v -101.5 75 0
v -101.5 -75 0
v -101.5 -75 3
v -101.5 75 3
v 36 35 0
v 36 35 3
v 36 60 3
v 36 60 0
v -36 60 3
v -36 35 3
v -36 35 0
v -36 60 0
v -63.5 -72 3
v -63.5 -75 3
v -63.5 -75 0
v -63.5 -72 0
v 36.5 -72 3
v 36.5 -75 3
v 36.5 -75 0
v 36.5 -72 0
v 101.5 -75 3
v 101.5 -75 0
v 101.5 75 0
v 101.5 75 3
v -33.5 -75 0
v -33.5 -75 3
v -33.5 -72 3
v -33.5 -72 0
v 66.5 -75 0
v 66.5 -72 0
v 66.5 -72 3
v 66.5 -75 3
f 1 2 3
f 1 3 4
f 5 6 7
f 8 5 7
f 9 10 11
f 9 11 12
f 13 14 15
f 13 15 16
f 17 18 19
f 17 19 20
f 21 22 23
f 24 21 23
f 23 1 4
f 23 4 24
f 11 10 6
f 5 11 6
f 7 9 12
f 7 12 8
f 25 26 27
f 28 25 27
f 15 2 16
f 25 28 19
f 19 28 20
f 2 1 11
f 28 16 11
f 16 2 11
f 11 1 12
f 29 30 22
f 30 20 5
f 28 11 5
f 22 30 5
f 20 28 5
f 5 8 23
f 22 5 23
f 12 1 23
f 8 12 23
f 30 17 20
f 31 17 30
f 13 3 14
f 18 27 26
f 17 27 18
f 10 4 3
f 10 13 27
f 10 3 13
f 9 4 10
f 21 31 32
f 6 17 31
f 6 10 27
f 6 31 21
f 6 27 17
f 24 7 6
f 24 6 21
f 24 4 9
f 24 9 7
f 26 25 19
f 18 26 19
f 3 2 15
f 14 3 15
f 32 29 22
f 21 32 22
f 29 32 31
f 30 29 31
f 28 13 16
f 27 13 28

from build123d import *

# Parameters (mm, degrees)
SKETCH1_W           = 203
SKETCH1_H           = 150
BOSS_EXTRUDE1_DEPTH = 3
SKETCH2_W           = 72
SKETCH2_H           = 25
CUT_EXTRUDE1_DEPTH  = 10
SKETCH3_W           = 30
SKETCH3_H           = 3
CUT_EXTRUDE2_DEPTH  = 10


with BuildPart() as part:
    # Sketch1 → Boss-Extrude1 (new body)
    with BuildSketch(Plane.XY):
        Rectangle(SKETCH1_W, SKETCH1_H)
    extrude(amount=BOSS_EXTRUDE1_DEPTH)

    # Sketch2 → Cut-Extrude1 (cut)
    with BuildSketch(Plane.XY.offset(3)):
        with Locations((0, 47.5)):
            Rectangle(SKETCH2_W, SKETCH2_H)
    extrude(amount=-CUT_EXTRUDE1_DEPTH, mode=Mode.SUBTRACT)

    # Sketch3 → Cut-Extrude2 (cut)
    with BuildSketch(Plane.XY.offset(3)):
        with Locations((-48.5, -73.5)):
            Rectangle(SKETCH3_W, SKETCH3_H)
        with Locations((51.5, -73.5)):
            Rectangle(SKETCH3_W, SKETCH3_H)
    extrude(amount=-CUT_EXTRUDE2_DEPTH, mode=Mode.SUBTRACT)


solid = part.part
